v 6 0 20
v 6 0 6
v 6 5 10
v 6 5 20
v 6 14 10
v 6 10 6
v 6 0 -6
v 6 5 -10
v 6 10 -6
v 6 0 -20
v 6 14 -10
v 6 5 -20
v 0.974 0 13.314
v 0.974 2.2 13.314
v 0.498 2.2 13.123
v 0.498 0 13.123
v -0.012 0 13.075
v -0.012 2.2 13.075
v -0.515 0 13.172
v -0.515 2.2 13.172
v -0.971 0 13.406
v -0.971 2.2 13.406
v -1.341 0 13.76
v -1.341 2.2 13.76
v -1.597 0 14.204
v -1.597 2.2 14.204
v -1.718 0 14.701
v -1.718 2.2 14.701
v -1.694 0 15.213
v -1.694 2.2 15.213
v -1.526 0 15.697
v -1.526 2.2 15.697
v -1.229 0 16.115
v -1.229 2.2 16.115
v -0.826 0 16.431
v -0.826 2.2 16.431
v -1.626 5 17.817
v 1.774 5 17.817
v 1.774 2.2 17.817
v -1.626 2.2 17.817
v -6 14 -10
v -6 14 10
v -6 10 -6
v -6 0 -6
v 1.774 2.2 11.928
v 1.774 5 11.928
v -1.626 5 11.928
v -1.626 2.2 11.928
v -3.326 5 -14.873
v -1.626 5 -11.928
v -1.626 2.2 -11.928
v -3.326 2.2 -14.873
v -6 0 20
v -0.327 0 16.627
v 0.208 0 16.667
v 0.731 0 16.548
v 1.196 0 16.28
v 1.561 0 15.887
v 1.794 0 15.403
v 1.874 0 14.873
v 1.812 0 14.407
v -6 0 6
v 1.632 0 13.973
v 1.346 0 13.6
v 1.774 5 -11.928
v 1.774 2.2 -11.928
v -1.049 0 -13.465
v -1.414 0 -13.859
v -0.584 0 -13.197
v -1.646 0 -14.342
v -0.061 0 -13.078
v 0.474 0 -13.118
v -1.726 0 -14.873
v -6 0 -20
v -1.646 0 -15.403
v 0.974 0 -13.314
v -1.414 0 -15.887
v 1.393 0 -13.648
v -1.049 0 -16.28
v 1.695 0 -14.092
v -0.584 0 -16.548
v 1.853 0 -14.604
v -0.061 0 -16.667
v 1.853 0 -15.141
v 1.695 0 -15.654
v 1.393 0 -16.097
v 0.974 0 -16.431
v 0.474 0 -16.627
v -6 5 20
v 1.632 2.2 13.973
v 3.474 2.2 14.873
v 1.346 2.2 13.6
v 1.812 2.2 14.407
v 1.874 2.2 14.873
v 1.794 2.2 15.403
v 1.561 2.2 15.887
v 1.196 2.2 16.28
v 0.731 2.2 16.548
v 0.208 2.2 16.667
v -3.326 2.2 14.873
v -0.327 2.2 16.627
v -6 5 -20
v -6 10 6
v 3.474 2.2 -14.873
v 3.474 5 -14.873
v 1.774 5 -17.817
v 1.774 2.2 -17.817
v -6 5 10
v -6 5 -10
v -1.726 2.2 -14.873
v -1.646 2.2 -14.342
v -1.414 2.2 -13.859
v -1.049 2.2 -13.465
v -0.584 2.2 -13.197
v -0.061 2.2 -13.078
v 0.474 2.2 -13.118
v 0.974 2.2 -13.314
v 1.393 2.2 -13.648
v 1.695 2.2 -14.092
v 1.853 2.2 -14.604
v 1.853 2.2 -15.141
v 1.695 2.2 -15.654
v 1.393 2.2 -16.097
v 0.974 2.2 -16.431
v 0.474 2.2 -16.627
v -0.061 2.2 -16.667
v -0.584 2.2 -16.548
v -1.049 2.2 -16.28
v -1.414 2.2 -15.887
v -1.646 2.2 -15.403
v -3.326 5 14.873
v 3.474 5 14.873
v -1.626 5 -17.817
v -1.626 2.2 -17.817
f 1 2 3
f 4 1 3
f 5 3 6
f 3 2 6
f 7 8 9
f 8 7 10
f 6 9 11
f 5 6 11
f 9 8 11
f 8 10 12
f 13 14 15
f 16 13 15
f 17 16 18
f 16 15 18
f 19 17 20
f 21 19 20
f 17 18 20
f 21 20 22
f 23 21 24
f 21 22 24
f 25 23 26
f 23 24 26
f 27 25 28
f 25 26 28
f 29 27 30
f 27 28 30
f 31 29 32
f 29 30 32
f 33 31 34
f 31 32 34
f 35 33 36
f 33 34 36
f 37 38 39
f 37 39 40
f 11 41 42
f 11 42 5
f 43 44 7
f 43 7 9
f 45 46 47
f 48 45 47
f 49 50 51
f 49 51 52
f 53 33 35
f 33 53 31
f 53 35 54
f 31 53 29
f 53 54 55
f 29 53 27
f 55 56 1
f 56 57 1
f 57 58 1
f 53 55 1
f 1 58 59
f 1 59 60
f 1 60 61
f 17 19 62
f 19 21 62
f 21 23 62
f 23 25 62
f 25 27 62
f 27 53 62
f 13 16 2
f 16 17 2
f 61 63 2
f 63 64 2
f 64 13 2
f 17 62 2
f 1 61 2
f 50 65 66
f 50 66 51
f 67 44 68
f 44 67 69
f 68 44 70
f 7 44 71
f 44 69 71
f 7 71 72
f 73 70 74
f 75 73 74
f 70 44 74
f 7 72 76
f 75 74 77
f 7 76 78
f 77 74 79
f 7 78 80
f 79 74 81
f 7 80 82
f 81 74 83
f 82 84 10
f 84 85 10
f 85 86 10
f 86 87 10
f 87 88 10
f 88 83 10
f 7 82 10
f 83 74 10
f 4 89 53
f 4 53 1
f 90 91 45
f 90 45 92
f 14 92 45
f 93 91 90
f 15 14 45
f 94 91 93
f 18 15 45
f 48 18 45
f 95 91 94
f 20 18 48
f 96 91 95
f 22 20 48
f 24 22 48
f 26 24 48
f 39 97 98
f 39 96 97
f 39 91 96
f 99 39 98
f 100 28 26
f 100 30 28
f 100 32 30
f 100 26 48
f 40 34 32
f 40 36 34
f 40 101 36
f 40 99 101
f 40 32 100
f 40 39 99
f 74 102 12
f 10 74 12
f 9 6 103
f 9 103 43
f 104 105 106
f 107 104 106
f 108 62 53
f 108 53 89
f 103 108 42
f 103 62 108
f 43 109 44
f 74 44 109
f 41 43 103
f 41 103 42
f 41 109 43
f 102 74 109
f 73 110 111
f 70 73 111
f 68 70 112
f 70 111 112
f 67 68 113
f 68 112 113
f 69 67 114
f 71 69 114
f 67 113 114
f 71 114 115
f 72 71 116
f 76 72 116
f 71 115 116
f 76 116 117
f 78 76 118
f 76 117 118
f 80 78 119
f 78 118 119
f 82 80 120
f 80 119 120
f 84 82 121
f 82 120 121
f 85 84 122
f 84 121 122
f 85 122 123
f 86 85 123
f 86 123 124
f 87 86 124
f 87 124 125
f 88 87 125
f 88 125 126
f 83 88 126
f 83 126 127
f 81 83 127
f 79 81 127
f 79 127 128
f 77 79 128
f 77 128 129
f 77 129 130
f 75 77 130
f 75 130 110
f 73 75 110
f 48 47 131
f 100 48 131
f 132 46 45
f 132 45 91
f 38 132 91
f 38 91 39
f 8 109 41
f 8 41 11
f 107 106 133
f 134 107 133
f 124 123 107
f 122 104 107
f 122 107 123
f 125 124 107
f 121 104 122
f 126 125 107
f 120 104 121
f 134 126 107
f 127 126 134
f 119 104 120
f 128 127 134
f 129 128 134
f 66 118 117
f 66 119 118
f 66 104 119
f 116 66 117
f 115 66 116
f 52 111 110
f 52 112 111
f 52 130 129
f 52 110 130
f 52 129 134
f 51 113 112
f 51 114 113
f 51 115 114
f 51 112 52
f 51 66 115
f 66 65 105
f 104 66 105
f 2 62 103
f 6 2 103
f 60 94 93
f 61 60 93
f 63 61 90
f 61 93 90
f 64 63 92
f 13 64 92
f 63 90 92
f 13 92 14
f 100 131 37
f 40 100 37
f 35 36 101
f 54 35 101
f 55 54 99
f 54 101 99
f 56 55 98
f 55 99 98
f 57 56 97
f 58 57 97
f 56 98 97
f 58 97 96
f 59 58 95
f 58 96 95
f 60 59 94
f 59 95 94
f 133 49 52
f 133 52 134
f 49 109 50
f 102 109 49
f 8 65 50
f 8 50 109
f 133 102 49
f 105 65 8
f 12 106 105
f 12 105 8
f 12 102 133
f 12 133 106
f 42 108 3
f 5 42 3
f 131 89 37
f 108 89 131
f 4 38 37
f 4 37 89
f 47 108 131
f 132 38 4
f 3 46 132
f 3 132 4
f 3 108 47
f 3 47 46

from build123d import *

# Parameters (mm, degrees)
ESBO_O1_W                     = 12
ESBO_O1_H                     = 20
RESSALTO_EXTRUS_O1_DEPTH      = 14
ESBO_O5_W                     = 12
ESBO_O5_H                     = 10
CORTE_EXTRUS_O1_DEPTH         = 12
RESSALTO_EXTRUS_O2_DEPTH      = 10
RESSALTO_EXTRUS_O2_DEPTH_BACK = 30
ESBO_O6_W                     = 12
ESBO_O6_H                     = 5
ESBO_O7_W                     = 12
ESBO_O7_H                     = 5
CORTE_EXTRUS_O2_DEPTH         = 12
ESBO_O8_R                     = 1.8
CORTE_EXTRUS_O3_DEPTH         = 5
ESBO_O8_3_R                   = 1.8
CORTE_EXTRUS_O4_DEPTH         = 5
ESBO_O8_4_R                   = 1.8
CORTE_EXTRUS_O5_DEPTH         = 2.8


with BuildPart() as part:
    # Esboço1 → Ressalto-extrusão1 (new body)
    with BuildSketch(Plane(origin=(0, 0, 0), x_dir=(1, 0, 0), z_dir=(0, 1, 0))):
        Rectangle(ESBO_O1_W, ESBO_O1_H)
    extrude(amount=RESSALTO_EXTRUS_O1_DEPTH)

    # Esboço5 → Corte-extrusão1 (cut)
    with BuildSketch(Plane(origin=(6, 0, 0), x_dir=(0, 0, -1), z_dir=(1, 0, 0))):
        with Locations((0, 5)):
            Rectangle(ESBO_O5_W, ESBO_O5_H)
    extrude(amount=-CORTE_EXTRUS_O1_DEPTH, mode=Mode.SUBTRACT)

    # Esboço6 → Ressalto-extrusão2 (add, two sides: drawn at the far end of the back side and taken through both)
    with BuildSketch(Plane.XY.offset(10).offset(-RESSALTO_EXTRUS_O2_DEPTH_BACK)):
        with Locations((0, 2.5)):
            Rectangle(ESBO_O6_W, ESBO_O6_H)
    extrude(amount=RESSALTO_EXTRUS_O2_DEPTH + RESSALTO_EXTRUS_O2_DEPTH_BACK)

    # Esboço7 → Corte-extrusão2 (cut)
    with BuildSketch(Plane(origin=(6, 0, 0), x_dir=(0, 0, -1), z_dir=(1, 0, 0))):
        with Locations((0, 2.5)):
            Rectangle(ESBO_O7_W, ESBO_O7_H)
    extrude(amount=-CORTE_EXTRUS_O2_DEPTH, mode=Mode.SUBTRACT)

    # Esboço8 → Corte-extrusão3 (cut)
    with BuildSketch(Plane(origin=(0, 5, 0), x_dir=(1, 0, 0), z_dir=(0, 1, 0))):
        with Locations((0.073596401, 14.872527995)):
            Circle(ESBO_O8_R)
    extrude(amount=-CORTE_EXTRUS_O3_DEPTH, mode=Mode.SUBTRACT)

    # Esboço8<3> → Corte-extrusão4 (cut)
    with BuildSketch(Plane(origin=(0, 5, 0), x_dir=(1, 0, 0), z_dir=(0, 1, 0))):
        with Locations((0.073596401, -14.872527995)):
            Circle(ESBO_O8_3_R)
    extrude(amount=-CORTE_EXTRUS_O4_DEPTH, mode=Mode.SUBTRACT)

    # Esboço8<4> → Corte-extrusão5 (cut)
    # profile 1 of 2: a face of its own
    with BuildSketch(Plane(origin=(0, 5, 0), x_dir=(1, 0, 0), z_dir=(0, 1, 0))):
        Polygon((-1.626403599, 11.928041622), (1.773596401, 11.928041622), (3.473596401, 14.872527995), (1.773596401, 17.817014367), (-1.626403599, 17.817014367), (-3.326403599, 14.872527995), align=None)
        with Locations((0.073596401, 14.872527995)):
            Circle(ESBO_O8_4_R, mode=Mode.SUBTRACT)
    # profile 2 of 2: a face of its own
    with BuildSketch(Plane(origin=(0, 5, 0), x_dir=(1, 0, 0), z_dir=(0, 1, 0))):
        Polygon((-3.326403599, -14.872527995), (-1.626403599, -17.817014367), (1.773596401, -17.817014367), (3.473596401, -14.872527995), (1.773596401, -11.928041622), (-1.626403599, -11.928041622), align=None)
        with Locations((0.073596401, -14.872527995)):
            Circle(ESBO_O8_4_R, mode=Mode.SUBTRACT)
    extrude(amount=-CORTE_EXTRUS_O5_DEPTH, mode=Mode.SUBTRACT)


solid = part.part
